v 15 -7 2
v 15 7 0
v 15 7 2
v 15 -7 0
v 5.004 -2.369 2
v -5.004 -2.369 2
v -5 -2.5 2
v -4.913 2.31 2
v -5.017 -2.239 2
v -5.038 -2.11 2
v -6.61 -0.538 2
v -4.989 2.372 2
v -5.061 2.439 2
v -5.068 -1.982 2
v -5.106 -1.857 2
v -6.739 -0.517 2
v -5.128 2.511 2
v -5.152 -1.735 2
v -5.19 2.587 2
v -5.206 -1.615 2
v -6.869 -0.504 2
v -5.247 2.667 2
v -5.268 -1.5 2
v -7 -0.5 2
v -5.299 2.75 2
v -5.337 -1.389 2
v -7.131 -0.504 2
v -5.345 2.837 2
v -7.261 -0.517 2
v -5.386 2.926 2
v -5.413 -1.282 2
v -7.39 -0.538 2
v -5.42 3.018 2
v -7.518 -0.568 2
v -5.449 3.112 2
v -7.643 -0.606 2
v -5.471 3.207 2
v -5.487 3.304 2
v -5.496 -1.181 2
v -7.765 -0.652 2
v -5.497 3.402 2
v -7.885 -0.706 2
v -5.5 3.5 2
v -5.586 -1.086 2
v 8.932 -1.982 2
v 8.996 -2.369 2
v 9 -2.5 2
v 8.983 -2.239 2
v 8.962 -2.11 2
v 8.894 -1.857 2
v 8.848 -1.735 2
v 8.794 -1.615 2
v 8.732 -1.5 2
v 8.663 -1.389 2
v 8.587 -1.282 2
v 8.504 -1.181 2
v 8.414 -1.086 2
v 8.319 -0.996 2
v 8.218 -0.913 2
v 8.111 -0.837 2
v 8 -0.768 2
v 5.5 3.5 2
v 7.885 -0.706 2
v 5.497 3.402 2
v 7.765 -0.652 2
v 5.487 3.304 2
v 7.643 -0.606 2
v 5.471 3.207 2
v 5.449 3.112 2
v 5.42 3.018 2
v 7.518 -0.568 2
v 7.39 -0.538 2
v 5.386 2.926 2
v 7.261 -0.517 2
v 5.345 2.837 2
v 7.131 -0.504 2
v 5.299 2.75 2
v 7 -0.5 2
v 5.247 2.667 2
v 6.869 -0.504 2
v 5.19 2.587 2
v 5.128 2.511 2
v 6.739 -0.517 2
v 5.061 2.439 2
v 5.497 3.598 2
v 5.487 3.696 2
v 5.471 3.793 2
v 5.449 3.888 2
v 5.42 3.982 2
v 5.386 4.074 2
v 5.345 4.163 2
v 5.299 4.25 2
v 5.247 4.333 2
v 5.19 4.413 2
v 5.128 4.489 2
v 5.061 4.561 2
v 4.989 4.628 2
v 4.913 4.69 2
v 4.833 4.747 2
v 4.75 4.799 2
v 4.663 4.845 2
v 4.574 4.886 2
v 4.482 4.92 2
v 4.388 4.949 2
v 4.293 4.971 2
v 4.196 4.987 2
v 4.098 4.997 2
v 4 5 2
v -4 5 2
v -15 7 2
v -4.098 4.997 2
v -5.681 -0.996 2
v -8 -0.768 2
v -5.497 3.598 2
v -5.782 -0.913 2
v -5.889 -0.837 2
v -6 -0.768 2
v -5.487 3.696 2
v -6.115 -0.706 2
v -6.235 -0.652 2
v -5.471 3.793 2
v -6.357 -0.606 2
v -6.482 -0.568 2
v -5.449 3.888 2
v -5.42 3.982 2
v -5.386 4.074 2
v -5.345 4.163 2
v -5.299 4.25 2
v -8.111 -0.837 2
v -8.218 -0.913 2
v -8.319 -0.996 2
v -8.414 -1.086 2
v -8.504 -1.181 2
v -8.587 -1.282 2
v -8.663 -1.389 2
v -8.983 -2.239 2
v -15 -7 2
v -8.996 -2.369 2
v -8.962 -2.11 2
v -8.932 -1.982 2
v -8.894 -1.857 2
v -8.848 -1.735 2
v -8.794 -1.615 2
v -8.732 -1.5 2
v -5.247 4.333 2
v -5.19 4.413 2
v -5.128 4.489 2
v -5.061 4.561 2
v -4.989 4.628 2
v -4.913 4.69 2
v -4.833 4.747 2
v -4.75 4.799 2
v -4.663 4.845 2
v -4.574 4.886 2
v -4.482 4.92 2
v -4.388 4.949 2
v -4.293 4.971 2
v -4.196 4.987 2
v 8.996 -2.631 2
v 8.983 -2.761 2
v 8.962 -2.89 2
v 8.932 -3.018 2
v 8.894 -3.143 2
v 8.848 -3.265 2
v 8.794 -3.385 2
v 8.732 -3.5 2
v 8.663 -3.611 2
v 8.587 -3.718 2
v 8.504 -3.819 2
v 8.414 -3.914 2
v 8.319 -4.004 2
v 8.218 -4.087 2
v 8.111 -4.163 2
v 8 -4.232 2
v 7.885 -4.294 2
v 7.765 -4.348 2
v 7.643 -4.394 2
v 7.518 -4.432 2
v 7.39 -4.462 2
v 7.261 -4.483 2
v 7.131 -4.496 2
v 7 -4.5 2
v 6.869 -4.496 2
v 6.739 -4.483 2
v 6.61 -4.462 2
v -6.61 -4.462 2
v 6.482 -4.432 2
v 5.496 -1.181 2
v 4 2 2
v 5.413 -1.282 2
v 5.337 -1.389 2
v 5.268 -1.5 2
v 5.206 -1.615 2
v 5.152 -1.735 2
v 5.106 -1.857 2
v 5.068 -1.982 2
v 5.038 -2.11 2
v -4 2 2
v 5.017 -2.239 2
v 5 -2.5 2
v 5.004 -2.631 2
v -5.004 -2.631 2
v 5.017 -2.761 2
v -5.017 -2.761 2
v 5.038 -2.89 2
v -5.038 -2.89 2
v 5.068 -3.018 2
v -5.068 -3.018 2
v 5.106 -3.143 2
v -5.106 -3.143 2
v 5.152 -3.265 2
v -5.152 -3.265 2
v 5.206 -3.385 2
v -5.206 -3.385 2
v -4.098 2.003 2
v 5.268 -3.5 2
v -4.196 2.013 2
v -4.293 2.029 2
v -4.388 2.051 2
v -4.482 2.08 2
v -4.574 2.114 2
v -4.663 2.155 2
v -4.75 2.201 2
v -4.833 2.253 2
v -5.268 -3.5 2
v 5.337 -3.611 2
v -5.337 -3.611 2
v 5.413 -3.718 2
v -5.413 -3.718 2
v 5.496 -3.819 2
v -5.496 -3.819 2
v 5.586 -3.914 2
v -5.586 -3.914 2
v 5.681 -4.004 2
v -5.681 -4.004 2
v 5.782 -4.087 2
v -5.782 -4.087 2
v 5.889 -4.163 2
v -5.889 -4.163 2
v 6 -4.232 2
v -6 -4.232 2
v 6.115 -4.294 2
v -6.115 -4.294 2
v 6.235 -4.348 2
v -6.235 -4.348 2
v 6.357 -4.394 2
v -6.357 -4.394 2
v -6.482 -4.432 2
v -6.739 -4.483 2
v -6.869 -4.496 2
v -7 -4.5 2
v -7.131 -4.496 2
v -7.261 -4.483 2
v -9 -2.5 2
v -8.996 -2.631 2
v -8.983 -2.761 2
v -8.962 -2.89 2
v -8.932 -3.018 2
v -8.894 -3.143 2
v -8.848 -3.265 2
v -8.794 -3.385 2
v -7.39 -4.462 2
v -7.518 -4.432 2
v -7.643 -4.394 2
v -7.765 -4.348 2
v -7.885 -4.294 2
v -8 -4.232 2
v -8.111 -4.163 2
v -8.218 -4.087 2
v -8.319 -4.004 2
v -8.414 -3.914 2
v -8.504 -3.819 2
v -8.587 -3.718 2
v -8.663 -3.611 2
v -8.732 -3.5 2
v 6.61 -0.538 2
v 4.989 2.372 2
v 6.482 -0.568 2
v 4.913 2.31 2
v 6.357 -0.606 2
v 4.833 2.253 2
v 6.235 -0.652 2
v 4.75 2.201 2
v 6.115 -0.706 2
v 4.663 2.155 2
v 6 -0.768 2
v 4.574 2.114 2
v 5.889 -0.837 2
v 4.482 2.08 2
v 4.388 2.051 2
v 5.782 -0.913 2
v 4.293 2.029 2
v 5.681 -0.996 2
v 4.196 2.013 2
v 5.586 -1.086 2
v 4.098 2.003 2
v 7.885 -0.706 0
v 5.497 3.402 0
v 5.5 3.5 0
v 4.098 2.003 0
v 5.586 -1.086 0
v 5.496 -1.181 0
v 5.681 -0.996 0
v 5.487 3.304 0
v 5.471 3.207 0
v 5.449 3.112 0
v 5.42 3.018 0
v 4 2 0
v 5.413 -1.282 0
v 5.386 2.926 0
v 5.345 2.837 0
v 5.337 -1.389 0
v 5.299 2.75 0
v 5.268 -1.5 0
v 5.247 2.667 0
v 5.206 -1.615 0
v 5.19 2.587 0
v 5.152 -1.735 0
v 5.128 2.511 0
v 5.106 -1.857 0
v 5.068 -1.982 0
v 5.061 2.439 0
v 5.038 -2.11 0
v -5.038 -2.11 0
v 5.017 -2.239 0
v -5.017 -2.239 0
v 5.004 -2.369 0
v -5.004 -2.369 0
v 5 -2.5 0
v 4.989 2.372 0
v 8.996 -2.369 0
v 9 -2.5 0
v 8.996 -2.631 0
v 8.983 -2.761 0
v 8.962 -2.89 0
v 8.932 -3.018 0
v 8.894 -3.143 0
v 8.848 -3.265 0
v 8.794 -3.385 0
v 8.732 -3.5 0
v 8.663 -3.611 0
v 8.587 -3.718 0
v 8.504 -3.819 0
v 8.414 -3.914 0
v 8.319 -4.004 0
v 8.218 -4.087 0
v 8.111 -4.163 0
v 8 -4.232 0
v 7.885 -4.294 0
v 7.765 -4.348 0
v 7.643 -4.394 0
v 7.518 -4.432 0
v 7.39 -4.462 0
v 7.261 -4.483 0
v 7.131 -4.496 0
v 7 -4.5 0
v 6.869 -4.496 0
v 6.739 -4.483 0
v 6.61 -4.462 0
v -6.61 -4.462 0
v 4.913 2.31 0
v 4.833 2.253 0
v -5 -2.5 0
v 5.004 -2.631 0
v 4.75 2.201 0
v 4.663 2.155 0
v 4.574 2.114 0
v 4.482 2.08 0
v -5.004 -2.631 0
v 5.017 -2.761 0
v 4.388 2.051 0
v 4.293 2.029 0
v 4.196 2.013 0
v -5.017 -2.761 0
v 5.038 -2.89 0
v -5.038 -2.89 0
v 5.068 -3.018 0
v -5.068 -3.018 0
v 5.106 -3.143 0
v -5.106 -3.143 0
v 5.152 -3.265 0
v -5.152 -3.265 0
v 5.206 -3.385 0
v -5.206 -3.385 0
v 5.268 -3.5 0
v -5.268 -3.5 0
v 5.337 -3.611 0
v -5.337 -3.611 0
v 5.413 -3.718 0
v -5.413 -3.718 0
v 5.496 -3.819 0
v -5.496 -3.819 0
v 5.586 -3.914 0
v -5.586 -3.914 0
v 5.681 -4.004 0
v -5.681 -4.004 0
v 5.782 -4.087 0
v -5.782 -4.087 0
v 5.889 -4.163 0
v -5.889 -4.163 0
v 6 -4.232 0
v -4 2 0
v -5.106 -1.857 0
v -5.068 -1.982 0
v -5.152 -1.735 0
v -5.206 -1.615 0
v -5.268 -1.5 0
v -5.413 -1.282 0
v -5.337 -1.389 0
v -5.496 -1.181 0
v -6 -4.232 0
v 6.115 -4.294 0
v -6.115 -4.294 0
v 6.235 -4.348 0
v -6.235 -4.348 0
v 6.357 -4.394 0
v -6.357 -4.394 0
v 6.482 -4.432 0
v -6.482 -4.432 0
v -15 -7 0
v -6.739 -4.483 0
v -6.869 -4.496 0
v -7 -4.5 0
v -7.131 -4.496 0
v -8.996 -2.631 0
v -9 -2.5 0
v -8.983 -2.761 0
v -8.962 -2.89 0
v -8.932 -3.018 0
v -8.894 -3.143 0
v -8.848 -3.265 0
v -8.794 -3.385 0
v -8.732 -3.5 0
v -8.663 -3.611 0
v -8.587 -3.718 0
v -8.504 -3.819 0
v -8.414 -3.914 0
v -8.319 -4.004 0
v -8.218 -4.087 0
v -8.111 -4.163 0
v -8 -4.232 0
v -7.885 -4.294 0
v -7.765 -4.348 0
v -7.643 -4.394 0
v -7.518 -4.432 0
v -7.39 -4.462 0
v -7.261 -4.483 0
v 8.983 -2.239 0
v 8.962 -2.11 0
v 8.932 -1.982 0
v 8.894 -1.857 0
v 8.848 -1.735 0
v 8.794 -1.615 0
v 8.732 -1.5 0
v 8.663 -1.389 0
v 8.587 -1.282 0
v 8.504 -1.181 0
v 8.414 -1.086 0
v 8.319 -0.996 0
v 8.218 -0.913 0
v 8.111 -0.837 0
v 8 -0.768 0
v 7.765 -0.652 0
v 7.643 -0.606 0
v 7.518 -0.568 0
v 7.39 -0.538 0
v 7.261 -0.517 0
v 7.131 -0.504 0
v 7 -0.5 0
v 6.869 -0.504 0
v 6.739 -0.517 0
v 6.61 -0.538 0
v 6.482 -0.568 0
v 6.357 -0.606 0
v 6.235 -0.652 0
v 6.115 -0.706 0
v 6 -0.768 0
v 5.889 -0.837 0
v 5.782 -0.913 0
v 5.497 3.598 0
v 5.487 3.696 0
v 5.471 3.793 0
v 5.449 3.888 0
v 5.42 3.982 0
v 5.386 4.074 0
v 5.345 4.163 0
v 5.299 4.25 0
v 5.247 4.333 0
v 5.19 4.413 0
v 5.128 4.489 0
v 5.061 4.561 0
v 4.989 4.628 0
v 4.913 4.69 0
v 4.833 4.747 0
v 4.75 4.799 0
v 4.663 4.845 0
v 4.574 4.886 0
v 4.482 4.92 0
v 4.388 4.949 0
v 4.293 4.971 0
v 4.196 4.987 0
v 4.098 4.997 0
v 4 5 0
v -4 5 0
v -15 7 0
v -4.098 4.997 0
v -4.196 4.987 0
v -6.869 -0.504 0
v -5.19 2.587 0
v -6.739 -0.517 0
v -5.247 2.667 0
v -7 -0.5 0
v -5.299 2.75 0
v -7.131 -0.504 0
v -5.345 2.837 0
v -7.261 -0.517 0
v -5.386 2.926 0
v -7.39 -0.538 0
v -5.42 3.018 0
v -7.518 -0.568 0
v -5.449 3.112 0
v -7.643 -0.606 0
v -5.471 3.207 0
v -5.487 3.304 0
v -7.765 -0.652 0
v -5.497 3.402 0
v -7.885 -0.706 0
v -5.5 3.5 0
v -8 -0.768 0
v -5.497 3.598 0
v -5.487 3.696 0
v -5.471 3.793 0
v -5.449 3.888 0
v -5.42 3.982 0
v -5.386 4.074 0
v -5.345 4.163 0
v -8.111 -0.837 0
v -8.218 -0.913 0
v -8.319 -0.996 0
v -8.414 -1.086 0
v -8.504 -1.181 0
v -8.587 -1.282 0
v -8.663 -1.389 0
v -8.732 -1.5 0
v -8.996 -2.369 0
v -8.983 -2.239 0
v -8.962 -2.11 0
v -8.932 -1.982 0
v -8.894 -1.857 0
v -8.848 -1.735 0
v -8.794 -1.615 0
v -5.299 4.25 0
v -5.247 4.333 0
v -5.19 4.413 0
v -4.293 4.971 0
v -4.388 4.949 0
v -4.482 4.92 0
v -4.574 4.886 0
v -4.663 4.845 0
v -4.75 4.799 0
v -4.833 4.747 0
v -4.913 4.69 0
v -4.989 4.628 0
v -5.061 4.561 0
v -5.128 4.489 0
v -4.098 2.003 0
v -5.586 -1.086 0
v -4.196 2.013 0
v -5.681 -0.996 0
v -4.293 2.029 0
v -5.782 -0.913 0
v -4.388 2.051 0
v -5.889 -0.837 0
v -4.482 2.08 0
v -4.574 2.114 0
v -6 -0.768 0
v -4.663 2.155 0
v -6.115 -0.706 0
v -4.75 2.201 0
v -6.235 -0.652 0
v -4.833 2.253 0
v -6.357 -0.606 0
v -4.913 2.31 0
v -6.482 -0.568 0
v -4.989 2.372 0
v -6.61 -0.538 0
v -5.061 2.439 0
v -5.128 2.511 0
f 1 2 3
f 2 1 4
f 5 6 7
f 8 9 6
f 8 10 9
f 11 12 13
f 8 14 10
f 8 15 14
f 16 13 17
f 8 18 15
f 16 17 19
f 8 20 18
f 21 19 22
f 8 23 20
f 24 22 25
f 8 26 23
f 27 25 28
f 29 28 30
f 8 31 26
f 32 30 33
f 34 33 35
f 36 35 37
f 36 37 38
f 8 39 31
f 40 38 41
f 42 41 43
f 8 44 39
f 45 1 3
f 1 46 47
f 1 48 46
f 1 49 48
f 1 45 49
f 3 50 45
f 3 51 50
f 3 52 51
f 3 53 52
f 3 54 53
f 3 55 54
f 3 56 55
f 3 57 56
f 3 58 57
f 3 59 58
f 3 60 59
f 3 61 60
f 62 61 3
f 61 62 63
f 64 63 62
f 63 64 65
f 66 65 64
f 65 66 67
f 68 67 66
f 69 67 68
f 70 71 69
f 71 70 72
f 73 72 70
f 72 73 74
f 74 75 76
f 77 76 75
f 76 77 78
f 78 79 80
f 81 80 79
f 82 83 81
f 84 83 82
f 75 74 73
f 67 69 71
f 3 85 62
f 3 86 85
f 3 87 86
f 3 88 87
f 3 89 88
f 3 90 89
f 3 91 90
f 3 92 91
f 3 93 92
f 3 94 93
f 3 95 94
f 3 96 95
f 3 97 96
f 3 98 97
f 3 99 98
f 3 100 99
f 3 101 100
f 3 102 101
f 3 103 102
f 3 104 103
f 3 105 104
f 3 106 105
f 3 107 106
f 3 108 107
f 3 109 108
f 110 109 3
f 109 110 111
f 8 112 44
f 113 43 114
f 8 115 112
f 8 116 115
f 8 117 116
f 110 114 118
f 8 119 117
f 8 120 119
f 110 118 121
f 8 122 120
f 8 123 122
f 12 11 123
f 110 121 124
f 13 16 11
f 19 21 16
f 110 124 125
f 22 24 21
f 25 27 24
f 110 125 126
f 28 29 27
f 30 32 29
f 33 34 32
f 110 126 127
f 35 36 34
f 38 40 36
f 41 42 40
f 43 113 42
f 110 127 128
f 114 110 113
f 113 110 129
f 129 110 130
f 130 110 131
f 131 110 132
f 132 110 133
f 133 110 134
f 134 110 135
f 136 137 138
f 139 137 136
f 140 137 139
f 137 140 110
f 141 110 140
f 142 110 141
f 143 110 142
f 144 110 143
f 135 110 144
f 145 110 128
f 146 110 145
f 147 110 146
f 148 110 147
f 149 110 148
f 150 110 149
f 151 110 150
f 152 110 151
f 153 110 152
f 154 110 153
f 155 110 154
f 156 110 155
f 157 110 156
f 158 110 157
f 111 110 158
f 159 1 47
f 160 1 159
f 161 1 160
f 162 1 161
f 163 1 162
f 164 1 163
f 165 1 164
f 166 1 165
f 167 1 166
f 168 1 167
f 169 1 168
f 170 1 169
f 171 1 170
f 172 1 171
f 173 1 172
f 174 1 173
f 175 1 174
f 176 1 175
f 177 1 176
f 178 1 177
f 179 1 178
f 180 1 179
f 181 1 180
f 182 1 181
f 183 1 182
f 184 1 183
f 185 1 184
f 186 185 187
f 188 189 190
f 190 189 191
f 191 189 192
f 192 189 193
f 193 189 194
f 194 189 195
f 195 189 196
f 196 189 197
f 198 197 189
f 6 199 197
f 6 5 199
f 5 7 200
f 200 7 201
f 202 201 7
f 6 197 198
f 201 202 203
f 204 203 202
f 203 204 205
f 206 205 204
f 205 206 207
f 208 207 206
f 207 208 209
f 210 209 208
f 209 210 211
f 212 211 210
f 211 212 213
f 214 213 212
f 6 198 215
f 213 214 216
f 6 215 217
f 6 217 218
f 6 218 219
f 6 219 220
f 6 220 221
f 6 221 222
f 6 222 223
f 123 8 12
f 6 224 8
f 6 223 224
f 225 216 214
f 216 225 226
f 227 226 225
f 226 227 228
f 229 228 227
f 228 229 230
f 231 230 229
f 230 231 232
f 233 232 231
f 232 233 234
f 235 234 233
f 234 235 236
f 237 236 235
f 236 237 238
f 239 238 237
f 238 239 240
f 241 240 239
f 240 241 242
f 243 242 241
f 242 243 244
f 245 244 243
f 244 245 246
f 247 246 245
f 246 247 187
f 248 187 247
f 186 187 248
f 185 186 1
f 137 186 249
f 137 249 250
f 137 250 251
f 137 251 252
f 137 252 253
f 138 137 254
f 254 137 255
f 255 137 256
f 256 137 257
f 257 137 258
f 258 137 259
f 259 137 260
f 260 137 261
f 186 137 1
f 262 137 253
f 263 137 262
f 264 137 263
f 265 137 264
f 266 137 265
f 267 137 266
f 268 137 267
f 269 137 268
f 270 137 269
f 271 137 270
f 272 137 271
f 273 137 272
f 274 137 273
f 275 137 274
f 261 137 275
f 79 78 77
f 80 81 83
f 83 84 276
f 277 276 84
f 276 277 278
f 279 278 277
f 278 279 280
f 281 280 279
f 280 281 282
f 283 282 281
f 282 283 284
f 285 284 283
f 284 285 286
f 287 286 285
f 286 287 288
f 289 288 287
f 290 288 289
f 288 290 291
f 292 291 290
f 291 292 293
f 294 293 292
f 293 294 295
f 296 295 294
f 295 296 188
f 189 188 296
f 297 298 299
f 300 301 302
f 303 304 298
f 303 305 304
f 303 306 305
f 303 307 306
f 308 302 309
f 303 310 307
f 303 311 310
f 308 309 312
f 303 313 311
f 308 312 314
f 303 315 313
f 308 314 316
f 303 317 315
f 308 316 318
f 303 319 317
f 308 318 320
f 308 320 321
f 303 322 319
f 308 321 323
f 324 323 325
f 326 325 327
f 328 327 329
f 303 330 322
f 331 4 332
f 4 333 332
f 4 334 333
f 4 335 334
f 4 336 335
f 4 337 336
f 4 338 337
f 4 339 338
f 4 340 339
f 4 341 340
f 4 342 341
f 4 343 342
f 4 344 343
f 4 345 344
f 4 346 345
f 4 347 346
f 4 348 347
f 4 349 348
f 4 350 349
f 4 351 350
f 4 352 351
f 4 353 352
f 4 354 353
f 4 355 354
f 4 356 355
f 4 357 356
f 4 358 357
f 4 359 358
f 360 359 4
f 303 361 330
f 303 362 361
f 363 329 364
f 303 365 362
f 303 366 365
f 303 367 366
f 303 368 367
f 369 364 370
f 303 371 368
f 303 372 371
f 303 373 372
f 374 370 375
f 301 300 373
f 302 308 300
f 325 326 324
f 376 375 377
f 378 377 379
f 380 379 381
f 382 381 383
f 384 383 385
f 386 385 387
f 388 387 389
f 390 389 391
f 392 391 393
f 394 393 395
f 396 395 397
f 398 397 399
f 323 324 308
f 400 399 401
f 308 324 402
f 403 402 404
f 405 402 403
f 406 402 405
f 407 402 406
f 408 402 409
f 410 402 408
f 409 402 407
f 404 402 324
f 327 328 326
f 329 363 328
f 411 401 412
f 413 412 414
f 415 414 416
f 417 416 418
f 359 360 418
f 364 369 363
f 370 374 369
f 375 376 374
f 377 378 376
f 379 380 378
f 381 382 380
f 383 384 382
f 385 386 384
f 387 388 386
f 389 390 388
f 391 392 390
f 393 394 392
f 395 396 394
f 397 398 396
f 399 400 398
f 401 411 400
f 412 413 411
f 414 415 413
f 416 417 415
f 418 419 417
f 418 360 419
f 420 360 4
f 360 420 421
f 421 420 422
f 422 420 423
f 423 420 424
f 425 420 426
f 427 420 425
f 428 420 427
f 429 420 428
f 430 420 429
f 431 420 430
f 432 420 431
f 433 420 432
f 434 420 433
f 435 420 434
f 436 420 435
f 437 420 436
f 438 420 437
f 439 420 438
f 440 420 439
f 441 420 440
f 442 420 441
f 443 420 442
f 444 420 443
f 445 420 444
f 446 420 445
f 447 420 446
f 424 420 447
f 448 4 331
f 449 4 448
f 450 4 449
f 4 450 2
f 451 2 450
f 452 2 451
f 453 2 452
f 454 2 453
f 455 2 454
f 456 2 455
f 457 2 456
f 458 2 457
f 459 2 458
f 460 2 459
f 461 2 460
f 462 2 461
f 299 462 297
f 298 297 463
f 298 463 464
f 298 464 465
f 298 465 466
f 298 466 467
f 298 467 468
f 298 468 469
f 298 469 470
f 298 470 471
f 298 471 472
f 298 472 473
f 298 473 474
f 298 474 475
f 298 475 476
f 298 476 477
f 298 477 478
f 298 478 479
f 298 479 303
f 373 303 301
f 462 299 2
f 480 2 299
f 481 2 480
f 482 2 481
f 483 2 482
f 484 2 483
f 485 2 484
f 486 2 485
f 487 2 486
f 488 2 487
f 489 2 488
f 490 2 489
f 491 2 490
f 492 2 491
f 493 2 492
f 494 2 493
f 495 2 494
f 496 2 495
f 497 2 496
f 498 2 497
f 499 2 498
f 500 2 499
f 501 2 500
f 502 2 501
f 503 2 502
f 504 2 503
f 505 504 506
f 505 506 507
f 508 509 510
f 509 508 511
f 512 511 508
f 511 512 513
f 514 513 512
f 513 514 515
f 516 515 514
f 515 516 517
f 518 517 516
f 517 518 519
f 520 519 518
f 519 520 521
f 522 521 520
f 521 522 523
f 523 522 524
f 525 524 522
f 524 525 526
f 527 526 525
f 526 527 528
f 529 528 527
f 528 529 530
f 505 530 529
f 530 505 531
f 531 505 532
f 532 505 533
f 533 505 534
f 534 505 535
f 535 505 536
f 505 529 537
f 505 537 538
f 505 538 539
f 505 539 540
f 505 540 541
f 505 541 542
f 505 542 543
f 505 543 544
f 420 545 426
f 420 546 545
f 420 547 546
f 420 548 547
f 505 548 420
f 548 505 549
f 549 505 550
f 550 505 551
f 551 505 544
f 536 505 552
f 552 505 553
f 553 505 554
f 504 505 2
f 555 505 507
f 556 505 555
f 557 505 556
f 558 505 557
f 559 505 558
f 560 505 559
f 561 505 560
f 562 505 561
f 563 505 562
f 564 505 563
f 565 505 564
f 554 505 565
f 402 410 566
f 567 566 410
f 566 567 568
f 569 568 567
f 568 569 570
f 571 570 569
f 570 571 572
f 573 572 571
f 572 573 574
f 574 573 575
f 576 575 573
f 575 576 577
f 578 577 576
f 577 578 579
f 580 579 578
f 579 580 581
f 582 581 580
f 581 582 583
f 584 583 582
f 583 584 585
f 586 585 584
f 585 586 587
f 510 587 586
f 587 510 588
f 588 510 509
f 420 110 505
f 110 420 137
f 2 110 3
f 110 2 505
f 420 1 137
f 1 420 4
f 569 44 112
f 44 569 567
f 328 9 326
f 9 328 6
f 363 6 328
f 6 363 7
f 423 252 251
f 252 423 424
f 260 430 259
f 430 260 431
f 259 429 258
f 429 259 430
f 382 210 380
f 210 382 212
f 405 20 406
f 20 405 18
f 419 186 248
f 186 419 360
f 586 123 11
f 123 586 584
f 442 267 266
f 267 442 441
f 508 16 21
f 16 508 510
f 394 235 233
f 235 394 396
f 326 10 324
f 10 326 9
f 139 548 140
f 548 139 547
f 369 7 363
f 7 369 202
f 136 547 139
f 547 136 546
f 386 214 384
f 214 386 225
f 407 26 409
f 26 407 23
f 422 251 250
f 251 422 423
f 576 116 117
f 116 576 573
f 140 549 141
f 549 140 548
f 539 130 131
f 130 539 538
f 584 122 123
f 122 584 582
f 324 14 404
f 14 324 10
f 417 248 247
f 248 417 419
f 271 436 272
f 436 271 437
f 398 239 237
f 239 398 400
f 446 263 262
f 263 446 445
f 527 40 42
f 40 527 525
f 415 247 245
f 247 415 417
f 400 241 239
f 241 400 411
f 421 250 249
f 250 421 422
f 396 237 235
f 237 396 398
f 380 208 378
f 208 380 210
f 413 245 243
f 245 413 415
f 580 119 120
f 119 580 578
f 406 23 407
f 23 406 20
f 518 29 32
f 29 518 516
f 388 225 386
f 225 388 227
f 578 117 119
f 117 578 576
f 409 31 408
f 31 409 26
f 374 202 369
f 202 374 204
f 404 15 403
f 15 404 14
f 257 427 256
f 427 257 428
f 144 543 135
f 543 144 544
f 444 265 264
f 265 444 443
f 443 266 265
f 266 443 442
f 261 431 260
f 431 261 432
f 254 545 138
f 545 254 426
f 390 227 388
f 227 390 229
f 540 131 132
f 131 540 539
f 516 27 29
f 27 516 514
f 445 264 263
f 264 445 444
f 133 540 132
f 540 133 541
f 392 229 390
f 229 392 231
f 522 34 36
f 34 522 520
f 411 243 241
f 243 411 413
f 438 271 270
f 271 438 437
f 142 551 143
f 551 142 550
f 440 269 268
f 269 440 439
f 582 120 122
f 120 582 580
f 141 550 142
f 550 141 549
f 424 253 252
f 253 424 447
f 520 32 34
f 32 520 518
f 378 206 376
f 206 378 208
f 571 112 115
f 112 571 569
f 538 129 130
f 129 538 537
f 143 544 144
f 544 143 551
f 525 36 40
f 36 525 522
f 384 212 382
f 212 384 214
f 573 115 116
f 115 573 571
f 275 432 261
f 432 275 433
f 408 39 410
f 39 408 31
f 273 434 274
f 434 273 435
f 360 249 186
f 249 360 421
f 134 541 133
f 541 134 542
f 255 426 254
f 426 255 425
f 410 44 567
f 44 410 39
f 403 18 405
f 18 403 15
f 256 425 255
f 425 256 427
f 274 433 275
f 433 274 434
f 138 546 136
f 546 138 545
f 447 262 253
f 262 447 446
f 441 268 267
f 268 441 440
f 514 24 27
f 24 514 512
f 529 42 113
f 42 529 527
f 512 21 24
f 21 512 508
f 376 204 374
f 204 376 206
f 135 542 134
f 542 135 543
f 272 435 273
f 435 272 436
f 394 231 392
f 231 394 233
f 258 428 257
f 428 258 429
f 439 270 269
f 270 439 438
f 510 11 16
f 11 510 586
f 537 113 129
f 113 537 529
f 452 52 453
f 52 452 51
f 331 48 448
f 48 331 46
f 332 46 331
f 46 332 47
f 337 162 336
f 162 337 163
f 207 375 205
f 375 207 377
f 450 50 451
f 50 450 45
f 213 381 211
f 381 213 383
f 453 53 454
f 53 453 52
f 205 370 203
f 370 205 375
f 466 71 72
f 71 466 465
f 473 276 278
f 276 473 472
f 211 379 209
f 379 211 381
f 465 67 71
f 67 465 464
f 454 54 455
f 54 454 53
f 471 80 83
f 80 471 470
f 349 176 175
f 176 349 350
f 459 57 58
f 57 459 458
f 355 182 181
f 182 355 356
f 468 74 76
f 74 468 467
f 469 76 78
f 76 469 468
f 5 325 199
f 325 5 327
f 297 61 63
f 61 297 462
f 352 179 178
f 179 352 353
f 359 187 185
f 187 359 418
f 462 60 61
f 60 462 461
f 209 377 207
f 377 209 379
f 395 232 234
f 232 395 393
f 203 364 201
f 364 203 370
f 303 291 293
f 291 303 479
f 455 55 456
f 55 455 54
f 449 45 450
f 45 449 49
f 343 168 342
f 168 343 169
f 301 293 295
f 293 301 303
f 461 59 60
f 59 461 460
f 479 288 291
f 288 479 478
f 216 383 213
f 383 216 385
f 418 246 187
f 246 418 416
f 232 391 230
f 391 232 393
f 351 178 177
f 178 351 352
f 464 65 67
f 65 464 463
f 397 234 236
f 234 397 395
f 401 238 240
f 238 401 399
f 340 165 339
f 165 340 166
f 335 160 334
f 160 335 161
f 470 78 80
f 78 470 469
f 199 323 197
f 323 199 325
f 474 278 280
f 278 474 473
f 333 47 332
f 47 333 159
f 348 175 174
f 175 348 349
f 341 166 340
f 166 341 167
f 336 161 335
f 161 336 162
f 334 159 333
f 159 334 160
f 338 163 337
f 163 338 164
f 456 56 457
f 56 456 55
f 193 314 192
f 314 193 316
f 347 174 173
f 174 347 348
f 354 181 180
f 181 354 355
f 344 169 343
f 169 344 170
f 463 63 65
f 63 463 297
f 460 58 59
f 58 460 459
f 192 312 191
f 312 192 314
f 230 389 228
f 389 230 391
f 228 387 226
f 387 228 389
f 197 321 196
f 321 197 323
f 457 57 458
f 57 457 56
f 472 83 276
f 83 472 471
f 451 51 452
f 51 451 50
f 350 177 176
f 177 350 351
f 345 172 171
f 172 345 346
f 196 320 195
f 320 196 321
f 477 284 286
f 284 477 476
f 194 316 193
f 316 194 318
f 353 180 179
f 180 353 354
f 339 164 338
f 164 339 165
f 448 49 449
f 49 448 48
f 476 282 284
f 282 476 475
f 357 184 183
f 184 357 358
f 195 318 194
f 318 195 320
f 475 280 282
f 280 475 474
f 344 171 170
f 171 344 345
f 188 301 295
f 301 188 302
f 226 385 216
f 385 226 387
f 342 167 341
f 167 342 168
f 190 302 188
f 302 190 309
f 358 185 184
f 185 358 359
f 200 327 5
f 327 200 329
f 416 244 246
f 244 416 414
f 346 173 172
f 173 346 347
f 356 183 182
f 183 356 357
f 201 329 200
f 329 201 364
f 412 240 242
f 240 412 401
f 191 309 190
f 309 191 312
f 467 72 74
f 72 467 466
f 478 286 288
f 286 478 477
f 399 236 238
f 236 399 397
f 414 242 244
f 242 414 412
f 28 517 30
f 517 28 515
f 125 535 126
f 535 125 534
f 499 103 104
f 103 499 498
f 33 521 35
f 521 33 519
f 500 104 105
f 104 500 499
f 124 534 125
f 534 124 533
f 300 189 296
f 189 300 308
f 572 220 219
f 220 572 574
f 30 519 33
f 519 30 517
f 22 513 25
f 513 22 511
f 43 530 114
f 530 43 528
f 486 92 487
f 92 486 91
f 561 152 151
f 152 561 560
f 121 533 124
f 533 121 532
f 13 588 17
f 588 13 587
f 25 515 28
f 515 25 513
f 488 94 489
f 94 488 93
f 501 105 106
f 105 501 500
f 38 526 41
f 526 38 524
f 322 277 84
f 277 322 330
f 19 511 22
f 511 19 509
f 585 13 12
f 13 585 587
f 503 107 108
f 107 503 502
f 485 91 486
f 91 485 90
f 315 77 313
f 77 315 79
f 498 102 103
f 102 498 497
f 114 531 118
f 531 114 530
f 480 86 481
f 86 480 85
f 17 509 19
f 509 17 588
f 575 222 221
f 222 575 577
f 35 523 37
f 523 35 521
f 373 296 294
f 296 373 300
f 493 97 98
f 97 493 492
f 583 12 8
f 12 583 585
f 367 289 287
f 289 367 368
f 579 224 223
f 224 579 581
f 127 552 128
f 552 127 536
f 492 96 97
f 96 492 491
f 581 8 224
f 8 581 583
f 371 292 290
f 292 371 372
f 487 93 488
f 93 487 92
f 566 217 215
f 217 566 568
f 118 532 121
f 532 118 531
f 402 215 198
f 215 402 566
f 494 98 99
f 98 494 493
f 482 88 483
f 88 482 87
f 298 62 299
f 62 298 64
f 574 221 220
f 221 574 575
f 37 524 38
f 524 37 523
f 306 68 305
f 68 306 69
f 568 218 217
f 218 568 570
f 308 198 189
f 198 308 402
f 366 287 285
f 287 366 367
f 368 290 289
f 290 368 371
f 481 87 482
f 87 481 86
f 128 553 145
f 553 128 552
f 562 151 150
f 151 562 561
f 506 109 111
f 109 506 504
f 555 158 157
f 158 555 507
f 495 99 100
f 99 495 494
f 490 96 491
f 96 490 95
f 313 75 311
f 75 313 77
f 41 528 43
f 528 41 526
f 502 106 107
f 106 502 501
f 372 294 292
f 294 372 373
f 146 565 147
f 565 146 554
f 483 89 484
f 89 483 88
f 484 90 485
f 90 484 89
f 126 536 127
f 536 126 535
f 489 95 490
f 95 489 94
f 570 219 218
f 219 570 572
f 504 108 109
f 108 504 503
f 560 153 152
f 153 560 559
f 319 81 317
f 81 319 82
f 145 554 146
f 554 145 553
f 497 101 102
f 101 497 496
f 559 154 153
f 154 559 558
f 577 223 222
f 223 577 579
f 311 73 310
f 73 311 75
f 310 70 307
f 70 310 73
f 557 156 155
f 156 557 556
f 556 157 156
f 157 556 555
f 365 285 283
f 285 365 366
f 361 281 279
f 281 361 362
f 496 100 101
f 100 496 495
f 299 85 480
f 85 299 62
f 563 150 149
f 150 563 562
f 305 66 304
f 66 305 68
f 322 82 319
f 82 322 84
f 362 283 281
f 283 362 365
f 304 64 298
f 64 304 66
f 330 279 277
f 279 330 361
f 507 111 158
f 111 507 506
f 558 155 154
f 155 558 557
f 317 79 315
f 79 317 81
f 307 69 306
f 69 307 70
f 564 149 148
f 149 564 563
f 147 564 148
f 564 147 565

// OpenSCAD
// Auto-generated from tests/data/feature_fixtures_manifest.json
// fixture: plate_mixed_linear_and_slot
// fixture_type: plate
// description: Mixed-feature plate with both repeated holes and a rounded slot.
$fn = 96;

plate_size = [30.000000, 14.000000, 2.000000];
plate_origin = [-15.000000, -7.000000, 0.000000];

module through_hole(center, diameter, height) {
  translate(center) cylinder(d=diameter, h=height, center=false);
}

module through_slot(start, end, width, height) {
  hull() {
    through_hole(start, width, height);
    through_hole(end, width, height);
  }
}

module counterbore_hole(center, through_d, bore_d, bore_depth, height) {
  translate(center) cylinder(d=through_d, h=height, center=false);
  translate([center[0], center[1], center[2] + height - bore_depth])
    cylinder(d=bore_d, h=bore_depth + 0.1, center=false);
}

difference() {
  translate(plate_origin) cube(plate_size);
  through_hole([-7.000000, -2.500000, -0.100000], 4.000000, 2.200000);  // hole_0
  through_hole([7.000000, -2.500000, -0.100000], 4.000000, 2.200000);  // hole_1
  through_slot([-4.000000, 3.500000, -0.100000], [4.000000, 3.500000, -0.100000], 3.000000, 2.200000);  // slot_0
}
